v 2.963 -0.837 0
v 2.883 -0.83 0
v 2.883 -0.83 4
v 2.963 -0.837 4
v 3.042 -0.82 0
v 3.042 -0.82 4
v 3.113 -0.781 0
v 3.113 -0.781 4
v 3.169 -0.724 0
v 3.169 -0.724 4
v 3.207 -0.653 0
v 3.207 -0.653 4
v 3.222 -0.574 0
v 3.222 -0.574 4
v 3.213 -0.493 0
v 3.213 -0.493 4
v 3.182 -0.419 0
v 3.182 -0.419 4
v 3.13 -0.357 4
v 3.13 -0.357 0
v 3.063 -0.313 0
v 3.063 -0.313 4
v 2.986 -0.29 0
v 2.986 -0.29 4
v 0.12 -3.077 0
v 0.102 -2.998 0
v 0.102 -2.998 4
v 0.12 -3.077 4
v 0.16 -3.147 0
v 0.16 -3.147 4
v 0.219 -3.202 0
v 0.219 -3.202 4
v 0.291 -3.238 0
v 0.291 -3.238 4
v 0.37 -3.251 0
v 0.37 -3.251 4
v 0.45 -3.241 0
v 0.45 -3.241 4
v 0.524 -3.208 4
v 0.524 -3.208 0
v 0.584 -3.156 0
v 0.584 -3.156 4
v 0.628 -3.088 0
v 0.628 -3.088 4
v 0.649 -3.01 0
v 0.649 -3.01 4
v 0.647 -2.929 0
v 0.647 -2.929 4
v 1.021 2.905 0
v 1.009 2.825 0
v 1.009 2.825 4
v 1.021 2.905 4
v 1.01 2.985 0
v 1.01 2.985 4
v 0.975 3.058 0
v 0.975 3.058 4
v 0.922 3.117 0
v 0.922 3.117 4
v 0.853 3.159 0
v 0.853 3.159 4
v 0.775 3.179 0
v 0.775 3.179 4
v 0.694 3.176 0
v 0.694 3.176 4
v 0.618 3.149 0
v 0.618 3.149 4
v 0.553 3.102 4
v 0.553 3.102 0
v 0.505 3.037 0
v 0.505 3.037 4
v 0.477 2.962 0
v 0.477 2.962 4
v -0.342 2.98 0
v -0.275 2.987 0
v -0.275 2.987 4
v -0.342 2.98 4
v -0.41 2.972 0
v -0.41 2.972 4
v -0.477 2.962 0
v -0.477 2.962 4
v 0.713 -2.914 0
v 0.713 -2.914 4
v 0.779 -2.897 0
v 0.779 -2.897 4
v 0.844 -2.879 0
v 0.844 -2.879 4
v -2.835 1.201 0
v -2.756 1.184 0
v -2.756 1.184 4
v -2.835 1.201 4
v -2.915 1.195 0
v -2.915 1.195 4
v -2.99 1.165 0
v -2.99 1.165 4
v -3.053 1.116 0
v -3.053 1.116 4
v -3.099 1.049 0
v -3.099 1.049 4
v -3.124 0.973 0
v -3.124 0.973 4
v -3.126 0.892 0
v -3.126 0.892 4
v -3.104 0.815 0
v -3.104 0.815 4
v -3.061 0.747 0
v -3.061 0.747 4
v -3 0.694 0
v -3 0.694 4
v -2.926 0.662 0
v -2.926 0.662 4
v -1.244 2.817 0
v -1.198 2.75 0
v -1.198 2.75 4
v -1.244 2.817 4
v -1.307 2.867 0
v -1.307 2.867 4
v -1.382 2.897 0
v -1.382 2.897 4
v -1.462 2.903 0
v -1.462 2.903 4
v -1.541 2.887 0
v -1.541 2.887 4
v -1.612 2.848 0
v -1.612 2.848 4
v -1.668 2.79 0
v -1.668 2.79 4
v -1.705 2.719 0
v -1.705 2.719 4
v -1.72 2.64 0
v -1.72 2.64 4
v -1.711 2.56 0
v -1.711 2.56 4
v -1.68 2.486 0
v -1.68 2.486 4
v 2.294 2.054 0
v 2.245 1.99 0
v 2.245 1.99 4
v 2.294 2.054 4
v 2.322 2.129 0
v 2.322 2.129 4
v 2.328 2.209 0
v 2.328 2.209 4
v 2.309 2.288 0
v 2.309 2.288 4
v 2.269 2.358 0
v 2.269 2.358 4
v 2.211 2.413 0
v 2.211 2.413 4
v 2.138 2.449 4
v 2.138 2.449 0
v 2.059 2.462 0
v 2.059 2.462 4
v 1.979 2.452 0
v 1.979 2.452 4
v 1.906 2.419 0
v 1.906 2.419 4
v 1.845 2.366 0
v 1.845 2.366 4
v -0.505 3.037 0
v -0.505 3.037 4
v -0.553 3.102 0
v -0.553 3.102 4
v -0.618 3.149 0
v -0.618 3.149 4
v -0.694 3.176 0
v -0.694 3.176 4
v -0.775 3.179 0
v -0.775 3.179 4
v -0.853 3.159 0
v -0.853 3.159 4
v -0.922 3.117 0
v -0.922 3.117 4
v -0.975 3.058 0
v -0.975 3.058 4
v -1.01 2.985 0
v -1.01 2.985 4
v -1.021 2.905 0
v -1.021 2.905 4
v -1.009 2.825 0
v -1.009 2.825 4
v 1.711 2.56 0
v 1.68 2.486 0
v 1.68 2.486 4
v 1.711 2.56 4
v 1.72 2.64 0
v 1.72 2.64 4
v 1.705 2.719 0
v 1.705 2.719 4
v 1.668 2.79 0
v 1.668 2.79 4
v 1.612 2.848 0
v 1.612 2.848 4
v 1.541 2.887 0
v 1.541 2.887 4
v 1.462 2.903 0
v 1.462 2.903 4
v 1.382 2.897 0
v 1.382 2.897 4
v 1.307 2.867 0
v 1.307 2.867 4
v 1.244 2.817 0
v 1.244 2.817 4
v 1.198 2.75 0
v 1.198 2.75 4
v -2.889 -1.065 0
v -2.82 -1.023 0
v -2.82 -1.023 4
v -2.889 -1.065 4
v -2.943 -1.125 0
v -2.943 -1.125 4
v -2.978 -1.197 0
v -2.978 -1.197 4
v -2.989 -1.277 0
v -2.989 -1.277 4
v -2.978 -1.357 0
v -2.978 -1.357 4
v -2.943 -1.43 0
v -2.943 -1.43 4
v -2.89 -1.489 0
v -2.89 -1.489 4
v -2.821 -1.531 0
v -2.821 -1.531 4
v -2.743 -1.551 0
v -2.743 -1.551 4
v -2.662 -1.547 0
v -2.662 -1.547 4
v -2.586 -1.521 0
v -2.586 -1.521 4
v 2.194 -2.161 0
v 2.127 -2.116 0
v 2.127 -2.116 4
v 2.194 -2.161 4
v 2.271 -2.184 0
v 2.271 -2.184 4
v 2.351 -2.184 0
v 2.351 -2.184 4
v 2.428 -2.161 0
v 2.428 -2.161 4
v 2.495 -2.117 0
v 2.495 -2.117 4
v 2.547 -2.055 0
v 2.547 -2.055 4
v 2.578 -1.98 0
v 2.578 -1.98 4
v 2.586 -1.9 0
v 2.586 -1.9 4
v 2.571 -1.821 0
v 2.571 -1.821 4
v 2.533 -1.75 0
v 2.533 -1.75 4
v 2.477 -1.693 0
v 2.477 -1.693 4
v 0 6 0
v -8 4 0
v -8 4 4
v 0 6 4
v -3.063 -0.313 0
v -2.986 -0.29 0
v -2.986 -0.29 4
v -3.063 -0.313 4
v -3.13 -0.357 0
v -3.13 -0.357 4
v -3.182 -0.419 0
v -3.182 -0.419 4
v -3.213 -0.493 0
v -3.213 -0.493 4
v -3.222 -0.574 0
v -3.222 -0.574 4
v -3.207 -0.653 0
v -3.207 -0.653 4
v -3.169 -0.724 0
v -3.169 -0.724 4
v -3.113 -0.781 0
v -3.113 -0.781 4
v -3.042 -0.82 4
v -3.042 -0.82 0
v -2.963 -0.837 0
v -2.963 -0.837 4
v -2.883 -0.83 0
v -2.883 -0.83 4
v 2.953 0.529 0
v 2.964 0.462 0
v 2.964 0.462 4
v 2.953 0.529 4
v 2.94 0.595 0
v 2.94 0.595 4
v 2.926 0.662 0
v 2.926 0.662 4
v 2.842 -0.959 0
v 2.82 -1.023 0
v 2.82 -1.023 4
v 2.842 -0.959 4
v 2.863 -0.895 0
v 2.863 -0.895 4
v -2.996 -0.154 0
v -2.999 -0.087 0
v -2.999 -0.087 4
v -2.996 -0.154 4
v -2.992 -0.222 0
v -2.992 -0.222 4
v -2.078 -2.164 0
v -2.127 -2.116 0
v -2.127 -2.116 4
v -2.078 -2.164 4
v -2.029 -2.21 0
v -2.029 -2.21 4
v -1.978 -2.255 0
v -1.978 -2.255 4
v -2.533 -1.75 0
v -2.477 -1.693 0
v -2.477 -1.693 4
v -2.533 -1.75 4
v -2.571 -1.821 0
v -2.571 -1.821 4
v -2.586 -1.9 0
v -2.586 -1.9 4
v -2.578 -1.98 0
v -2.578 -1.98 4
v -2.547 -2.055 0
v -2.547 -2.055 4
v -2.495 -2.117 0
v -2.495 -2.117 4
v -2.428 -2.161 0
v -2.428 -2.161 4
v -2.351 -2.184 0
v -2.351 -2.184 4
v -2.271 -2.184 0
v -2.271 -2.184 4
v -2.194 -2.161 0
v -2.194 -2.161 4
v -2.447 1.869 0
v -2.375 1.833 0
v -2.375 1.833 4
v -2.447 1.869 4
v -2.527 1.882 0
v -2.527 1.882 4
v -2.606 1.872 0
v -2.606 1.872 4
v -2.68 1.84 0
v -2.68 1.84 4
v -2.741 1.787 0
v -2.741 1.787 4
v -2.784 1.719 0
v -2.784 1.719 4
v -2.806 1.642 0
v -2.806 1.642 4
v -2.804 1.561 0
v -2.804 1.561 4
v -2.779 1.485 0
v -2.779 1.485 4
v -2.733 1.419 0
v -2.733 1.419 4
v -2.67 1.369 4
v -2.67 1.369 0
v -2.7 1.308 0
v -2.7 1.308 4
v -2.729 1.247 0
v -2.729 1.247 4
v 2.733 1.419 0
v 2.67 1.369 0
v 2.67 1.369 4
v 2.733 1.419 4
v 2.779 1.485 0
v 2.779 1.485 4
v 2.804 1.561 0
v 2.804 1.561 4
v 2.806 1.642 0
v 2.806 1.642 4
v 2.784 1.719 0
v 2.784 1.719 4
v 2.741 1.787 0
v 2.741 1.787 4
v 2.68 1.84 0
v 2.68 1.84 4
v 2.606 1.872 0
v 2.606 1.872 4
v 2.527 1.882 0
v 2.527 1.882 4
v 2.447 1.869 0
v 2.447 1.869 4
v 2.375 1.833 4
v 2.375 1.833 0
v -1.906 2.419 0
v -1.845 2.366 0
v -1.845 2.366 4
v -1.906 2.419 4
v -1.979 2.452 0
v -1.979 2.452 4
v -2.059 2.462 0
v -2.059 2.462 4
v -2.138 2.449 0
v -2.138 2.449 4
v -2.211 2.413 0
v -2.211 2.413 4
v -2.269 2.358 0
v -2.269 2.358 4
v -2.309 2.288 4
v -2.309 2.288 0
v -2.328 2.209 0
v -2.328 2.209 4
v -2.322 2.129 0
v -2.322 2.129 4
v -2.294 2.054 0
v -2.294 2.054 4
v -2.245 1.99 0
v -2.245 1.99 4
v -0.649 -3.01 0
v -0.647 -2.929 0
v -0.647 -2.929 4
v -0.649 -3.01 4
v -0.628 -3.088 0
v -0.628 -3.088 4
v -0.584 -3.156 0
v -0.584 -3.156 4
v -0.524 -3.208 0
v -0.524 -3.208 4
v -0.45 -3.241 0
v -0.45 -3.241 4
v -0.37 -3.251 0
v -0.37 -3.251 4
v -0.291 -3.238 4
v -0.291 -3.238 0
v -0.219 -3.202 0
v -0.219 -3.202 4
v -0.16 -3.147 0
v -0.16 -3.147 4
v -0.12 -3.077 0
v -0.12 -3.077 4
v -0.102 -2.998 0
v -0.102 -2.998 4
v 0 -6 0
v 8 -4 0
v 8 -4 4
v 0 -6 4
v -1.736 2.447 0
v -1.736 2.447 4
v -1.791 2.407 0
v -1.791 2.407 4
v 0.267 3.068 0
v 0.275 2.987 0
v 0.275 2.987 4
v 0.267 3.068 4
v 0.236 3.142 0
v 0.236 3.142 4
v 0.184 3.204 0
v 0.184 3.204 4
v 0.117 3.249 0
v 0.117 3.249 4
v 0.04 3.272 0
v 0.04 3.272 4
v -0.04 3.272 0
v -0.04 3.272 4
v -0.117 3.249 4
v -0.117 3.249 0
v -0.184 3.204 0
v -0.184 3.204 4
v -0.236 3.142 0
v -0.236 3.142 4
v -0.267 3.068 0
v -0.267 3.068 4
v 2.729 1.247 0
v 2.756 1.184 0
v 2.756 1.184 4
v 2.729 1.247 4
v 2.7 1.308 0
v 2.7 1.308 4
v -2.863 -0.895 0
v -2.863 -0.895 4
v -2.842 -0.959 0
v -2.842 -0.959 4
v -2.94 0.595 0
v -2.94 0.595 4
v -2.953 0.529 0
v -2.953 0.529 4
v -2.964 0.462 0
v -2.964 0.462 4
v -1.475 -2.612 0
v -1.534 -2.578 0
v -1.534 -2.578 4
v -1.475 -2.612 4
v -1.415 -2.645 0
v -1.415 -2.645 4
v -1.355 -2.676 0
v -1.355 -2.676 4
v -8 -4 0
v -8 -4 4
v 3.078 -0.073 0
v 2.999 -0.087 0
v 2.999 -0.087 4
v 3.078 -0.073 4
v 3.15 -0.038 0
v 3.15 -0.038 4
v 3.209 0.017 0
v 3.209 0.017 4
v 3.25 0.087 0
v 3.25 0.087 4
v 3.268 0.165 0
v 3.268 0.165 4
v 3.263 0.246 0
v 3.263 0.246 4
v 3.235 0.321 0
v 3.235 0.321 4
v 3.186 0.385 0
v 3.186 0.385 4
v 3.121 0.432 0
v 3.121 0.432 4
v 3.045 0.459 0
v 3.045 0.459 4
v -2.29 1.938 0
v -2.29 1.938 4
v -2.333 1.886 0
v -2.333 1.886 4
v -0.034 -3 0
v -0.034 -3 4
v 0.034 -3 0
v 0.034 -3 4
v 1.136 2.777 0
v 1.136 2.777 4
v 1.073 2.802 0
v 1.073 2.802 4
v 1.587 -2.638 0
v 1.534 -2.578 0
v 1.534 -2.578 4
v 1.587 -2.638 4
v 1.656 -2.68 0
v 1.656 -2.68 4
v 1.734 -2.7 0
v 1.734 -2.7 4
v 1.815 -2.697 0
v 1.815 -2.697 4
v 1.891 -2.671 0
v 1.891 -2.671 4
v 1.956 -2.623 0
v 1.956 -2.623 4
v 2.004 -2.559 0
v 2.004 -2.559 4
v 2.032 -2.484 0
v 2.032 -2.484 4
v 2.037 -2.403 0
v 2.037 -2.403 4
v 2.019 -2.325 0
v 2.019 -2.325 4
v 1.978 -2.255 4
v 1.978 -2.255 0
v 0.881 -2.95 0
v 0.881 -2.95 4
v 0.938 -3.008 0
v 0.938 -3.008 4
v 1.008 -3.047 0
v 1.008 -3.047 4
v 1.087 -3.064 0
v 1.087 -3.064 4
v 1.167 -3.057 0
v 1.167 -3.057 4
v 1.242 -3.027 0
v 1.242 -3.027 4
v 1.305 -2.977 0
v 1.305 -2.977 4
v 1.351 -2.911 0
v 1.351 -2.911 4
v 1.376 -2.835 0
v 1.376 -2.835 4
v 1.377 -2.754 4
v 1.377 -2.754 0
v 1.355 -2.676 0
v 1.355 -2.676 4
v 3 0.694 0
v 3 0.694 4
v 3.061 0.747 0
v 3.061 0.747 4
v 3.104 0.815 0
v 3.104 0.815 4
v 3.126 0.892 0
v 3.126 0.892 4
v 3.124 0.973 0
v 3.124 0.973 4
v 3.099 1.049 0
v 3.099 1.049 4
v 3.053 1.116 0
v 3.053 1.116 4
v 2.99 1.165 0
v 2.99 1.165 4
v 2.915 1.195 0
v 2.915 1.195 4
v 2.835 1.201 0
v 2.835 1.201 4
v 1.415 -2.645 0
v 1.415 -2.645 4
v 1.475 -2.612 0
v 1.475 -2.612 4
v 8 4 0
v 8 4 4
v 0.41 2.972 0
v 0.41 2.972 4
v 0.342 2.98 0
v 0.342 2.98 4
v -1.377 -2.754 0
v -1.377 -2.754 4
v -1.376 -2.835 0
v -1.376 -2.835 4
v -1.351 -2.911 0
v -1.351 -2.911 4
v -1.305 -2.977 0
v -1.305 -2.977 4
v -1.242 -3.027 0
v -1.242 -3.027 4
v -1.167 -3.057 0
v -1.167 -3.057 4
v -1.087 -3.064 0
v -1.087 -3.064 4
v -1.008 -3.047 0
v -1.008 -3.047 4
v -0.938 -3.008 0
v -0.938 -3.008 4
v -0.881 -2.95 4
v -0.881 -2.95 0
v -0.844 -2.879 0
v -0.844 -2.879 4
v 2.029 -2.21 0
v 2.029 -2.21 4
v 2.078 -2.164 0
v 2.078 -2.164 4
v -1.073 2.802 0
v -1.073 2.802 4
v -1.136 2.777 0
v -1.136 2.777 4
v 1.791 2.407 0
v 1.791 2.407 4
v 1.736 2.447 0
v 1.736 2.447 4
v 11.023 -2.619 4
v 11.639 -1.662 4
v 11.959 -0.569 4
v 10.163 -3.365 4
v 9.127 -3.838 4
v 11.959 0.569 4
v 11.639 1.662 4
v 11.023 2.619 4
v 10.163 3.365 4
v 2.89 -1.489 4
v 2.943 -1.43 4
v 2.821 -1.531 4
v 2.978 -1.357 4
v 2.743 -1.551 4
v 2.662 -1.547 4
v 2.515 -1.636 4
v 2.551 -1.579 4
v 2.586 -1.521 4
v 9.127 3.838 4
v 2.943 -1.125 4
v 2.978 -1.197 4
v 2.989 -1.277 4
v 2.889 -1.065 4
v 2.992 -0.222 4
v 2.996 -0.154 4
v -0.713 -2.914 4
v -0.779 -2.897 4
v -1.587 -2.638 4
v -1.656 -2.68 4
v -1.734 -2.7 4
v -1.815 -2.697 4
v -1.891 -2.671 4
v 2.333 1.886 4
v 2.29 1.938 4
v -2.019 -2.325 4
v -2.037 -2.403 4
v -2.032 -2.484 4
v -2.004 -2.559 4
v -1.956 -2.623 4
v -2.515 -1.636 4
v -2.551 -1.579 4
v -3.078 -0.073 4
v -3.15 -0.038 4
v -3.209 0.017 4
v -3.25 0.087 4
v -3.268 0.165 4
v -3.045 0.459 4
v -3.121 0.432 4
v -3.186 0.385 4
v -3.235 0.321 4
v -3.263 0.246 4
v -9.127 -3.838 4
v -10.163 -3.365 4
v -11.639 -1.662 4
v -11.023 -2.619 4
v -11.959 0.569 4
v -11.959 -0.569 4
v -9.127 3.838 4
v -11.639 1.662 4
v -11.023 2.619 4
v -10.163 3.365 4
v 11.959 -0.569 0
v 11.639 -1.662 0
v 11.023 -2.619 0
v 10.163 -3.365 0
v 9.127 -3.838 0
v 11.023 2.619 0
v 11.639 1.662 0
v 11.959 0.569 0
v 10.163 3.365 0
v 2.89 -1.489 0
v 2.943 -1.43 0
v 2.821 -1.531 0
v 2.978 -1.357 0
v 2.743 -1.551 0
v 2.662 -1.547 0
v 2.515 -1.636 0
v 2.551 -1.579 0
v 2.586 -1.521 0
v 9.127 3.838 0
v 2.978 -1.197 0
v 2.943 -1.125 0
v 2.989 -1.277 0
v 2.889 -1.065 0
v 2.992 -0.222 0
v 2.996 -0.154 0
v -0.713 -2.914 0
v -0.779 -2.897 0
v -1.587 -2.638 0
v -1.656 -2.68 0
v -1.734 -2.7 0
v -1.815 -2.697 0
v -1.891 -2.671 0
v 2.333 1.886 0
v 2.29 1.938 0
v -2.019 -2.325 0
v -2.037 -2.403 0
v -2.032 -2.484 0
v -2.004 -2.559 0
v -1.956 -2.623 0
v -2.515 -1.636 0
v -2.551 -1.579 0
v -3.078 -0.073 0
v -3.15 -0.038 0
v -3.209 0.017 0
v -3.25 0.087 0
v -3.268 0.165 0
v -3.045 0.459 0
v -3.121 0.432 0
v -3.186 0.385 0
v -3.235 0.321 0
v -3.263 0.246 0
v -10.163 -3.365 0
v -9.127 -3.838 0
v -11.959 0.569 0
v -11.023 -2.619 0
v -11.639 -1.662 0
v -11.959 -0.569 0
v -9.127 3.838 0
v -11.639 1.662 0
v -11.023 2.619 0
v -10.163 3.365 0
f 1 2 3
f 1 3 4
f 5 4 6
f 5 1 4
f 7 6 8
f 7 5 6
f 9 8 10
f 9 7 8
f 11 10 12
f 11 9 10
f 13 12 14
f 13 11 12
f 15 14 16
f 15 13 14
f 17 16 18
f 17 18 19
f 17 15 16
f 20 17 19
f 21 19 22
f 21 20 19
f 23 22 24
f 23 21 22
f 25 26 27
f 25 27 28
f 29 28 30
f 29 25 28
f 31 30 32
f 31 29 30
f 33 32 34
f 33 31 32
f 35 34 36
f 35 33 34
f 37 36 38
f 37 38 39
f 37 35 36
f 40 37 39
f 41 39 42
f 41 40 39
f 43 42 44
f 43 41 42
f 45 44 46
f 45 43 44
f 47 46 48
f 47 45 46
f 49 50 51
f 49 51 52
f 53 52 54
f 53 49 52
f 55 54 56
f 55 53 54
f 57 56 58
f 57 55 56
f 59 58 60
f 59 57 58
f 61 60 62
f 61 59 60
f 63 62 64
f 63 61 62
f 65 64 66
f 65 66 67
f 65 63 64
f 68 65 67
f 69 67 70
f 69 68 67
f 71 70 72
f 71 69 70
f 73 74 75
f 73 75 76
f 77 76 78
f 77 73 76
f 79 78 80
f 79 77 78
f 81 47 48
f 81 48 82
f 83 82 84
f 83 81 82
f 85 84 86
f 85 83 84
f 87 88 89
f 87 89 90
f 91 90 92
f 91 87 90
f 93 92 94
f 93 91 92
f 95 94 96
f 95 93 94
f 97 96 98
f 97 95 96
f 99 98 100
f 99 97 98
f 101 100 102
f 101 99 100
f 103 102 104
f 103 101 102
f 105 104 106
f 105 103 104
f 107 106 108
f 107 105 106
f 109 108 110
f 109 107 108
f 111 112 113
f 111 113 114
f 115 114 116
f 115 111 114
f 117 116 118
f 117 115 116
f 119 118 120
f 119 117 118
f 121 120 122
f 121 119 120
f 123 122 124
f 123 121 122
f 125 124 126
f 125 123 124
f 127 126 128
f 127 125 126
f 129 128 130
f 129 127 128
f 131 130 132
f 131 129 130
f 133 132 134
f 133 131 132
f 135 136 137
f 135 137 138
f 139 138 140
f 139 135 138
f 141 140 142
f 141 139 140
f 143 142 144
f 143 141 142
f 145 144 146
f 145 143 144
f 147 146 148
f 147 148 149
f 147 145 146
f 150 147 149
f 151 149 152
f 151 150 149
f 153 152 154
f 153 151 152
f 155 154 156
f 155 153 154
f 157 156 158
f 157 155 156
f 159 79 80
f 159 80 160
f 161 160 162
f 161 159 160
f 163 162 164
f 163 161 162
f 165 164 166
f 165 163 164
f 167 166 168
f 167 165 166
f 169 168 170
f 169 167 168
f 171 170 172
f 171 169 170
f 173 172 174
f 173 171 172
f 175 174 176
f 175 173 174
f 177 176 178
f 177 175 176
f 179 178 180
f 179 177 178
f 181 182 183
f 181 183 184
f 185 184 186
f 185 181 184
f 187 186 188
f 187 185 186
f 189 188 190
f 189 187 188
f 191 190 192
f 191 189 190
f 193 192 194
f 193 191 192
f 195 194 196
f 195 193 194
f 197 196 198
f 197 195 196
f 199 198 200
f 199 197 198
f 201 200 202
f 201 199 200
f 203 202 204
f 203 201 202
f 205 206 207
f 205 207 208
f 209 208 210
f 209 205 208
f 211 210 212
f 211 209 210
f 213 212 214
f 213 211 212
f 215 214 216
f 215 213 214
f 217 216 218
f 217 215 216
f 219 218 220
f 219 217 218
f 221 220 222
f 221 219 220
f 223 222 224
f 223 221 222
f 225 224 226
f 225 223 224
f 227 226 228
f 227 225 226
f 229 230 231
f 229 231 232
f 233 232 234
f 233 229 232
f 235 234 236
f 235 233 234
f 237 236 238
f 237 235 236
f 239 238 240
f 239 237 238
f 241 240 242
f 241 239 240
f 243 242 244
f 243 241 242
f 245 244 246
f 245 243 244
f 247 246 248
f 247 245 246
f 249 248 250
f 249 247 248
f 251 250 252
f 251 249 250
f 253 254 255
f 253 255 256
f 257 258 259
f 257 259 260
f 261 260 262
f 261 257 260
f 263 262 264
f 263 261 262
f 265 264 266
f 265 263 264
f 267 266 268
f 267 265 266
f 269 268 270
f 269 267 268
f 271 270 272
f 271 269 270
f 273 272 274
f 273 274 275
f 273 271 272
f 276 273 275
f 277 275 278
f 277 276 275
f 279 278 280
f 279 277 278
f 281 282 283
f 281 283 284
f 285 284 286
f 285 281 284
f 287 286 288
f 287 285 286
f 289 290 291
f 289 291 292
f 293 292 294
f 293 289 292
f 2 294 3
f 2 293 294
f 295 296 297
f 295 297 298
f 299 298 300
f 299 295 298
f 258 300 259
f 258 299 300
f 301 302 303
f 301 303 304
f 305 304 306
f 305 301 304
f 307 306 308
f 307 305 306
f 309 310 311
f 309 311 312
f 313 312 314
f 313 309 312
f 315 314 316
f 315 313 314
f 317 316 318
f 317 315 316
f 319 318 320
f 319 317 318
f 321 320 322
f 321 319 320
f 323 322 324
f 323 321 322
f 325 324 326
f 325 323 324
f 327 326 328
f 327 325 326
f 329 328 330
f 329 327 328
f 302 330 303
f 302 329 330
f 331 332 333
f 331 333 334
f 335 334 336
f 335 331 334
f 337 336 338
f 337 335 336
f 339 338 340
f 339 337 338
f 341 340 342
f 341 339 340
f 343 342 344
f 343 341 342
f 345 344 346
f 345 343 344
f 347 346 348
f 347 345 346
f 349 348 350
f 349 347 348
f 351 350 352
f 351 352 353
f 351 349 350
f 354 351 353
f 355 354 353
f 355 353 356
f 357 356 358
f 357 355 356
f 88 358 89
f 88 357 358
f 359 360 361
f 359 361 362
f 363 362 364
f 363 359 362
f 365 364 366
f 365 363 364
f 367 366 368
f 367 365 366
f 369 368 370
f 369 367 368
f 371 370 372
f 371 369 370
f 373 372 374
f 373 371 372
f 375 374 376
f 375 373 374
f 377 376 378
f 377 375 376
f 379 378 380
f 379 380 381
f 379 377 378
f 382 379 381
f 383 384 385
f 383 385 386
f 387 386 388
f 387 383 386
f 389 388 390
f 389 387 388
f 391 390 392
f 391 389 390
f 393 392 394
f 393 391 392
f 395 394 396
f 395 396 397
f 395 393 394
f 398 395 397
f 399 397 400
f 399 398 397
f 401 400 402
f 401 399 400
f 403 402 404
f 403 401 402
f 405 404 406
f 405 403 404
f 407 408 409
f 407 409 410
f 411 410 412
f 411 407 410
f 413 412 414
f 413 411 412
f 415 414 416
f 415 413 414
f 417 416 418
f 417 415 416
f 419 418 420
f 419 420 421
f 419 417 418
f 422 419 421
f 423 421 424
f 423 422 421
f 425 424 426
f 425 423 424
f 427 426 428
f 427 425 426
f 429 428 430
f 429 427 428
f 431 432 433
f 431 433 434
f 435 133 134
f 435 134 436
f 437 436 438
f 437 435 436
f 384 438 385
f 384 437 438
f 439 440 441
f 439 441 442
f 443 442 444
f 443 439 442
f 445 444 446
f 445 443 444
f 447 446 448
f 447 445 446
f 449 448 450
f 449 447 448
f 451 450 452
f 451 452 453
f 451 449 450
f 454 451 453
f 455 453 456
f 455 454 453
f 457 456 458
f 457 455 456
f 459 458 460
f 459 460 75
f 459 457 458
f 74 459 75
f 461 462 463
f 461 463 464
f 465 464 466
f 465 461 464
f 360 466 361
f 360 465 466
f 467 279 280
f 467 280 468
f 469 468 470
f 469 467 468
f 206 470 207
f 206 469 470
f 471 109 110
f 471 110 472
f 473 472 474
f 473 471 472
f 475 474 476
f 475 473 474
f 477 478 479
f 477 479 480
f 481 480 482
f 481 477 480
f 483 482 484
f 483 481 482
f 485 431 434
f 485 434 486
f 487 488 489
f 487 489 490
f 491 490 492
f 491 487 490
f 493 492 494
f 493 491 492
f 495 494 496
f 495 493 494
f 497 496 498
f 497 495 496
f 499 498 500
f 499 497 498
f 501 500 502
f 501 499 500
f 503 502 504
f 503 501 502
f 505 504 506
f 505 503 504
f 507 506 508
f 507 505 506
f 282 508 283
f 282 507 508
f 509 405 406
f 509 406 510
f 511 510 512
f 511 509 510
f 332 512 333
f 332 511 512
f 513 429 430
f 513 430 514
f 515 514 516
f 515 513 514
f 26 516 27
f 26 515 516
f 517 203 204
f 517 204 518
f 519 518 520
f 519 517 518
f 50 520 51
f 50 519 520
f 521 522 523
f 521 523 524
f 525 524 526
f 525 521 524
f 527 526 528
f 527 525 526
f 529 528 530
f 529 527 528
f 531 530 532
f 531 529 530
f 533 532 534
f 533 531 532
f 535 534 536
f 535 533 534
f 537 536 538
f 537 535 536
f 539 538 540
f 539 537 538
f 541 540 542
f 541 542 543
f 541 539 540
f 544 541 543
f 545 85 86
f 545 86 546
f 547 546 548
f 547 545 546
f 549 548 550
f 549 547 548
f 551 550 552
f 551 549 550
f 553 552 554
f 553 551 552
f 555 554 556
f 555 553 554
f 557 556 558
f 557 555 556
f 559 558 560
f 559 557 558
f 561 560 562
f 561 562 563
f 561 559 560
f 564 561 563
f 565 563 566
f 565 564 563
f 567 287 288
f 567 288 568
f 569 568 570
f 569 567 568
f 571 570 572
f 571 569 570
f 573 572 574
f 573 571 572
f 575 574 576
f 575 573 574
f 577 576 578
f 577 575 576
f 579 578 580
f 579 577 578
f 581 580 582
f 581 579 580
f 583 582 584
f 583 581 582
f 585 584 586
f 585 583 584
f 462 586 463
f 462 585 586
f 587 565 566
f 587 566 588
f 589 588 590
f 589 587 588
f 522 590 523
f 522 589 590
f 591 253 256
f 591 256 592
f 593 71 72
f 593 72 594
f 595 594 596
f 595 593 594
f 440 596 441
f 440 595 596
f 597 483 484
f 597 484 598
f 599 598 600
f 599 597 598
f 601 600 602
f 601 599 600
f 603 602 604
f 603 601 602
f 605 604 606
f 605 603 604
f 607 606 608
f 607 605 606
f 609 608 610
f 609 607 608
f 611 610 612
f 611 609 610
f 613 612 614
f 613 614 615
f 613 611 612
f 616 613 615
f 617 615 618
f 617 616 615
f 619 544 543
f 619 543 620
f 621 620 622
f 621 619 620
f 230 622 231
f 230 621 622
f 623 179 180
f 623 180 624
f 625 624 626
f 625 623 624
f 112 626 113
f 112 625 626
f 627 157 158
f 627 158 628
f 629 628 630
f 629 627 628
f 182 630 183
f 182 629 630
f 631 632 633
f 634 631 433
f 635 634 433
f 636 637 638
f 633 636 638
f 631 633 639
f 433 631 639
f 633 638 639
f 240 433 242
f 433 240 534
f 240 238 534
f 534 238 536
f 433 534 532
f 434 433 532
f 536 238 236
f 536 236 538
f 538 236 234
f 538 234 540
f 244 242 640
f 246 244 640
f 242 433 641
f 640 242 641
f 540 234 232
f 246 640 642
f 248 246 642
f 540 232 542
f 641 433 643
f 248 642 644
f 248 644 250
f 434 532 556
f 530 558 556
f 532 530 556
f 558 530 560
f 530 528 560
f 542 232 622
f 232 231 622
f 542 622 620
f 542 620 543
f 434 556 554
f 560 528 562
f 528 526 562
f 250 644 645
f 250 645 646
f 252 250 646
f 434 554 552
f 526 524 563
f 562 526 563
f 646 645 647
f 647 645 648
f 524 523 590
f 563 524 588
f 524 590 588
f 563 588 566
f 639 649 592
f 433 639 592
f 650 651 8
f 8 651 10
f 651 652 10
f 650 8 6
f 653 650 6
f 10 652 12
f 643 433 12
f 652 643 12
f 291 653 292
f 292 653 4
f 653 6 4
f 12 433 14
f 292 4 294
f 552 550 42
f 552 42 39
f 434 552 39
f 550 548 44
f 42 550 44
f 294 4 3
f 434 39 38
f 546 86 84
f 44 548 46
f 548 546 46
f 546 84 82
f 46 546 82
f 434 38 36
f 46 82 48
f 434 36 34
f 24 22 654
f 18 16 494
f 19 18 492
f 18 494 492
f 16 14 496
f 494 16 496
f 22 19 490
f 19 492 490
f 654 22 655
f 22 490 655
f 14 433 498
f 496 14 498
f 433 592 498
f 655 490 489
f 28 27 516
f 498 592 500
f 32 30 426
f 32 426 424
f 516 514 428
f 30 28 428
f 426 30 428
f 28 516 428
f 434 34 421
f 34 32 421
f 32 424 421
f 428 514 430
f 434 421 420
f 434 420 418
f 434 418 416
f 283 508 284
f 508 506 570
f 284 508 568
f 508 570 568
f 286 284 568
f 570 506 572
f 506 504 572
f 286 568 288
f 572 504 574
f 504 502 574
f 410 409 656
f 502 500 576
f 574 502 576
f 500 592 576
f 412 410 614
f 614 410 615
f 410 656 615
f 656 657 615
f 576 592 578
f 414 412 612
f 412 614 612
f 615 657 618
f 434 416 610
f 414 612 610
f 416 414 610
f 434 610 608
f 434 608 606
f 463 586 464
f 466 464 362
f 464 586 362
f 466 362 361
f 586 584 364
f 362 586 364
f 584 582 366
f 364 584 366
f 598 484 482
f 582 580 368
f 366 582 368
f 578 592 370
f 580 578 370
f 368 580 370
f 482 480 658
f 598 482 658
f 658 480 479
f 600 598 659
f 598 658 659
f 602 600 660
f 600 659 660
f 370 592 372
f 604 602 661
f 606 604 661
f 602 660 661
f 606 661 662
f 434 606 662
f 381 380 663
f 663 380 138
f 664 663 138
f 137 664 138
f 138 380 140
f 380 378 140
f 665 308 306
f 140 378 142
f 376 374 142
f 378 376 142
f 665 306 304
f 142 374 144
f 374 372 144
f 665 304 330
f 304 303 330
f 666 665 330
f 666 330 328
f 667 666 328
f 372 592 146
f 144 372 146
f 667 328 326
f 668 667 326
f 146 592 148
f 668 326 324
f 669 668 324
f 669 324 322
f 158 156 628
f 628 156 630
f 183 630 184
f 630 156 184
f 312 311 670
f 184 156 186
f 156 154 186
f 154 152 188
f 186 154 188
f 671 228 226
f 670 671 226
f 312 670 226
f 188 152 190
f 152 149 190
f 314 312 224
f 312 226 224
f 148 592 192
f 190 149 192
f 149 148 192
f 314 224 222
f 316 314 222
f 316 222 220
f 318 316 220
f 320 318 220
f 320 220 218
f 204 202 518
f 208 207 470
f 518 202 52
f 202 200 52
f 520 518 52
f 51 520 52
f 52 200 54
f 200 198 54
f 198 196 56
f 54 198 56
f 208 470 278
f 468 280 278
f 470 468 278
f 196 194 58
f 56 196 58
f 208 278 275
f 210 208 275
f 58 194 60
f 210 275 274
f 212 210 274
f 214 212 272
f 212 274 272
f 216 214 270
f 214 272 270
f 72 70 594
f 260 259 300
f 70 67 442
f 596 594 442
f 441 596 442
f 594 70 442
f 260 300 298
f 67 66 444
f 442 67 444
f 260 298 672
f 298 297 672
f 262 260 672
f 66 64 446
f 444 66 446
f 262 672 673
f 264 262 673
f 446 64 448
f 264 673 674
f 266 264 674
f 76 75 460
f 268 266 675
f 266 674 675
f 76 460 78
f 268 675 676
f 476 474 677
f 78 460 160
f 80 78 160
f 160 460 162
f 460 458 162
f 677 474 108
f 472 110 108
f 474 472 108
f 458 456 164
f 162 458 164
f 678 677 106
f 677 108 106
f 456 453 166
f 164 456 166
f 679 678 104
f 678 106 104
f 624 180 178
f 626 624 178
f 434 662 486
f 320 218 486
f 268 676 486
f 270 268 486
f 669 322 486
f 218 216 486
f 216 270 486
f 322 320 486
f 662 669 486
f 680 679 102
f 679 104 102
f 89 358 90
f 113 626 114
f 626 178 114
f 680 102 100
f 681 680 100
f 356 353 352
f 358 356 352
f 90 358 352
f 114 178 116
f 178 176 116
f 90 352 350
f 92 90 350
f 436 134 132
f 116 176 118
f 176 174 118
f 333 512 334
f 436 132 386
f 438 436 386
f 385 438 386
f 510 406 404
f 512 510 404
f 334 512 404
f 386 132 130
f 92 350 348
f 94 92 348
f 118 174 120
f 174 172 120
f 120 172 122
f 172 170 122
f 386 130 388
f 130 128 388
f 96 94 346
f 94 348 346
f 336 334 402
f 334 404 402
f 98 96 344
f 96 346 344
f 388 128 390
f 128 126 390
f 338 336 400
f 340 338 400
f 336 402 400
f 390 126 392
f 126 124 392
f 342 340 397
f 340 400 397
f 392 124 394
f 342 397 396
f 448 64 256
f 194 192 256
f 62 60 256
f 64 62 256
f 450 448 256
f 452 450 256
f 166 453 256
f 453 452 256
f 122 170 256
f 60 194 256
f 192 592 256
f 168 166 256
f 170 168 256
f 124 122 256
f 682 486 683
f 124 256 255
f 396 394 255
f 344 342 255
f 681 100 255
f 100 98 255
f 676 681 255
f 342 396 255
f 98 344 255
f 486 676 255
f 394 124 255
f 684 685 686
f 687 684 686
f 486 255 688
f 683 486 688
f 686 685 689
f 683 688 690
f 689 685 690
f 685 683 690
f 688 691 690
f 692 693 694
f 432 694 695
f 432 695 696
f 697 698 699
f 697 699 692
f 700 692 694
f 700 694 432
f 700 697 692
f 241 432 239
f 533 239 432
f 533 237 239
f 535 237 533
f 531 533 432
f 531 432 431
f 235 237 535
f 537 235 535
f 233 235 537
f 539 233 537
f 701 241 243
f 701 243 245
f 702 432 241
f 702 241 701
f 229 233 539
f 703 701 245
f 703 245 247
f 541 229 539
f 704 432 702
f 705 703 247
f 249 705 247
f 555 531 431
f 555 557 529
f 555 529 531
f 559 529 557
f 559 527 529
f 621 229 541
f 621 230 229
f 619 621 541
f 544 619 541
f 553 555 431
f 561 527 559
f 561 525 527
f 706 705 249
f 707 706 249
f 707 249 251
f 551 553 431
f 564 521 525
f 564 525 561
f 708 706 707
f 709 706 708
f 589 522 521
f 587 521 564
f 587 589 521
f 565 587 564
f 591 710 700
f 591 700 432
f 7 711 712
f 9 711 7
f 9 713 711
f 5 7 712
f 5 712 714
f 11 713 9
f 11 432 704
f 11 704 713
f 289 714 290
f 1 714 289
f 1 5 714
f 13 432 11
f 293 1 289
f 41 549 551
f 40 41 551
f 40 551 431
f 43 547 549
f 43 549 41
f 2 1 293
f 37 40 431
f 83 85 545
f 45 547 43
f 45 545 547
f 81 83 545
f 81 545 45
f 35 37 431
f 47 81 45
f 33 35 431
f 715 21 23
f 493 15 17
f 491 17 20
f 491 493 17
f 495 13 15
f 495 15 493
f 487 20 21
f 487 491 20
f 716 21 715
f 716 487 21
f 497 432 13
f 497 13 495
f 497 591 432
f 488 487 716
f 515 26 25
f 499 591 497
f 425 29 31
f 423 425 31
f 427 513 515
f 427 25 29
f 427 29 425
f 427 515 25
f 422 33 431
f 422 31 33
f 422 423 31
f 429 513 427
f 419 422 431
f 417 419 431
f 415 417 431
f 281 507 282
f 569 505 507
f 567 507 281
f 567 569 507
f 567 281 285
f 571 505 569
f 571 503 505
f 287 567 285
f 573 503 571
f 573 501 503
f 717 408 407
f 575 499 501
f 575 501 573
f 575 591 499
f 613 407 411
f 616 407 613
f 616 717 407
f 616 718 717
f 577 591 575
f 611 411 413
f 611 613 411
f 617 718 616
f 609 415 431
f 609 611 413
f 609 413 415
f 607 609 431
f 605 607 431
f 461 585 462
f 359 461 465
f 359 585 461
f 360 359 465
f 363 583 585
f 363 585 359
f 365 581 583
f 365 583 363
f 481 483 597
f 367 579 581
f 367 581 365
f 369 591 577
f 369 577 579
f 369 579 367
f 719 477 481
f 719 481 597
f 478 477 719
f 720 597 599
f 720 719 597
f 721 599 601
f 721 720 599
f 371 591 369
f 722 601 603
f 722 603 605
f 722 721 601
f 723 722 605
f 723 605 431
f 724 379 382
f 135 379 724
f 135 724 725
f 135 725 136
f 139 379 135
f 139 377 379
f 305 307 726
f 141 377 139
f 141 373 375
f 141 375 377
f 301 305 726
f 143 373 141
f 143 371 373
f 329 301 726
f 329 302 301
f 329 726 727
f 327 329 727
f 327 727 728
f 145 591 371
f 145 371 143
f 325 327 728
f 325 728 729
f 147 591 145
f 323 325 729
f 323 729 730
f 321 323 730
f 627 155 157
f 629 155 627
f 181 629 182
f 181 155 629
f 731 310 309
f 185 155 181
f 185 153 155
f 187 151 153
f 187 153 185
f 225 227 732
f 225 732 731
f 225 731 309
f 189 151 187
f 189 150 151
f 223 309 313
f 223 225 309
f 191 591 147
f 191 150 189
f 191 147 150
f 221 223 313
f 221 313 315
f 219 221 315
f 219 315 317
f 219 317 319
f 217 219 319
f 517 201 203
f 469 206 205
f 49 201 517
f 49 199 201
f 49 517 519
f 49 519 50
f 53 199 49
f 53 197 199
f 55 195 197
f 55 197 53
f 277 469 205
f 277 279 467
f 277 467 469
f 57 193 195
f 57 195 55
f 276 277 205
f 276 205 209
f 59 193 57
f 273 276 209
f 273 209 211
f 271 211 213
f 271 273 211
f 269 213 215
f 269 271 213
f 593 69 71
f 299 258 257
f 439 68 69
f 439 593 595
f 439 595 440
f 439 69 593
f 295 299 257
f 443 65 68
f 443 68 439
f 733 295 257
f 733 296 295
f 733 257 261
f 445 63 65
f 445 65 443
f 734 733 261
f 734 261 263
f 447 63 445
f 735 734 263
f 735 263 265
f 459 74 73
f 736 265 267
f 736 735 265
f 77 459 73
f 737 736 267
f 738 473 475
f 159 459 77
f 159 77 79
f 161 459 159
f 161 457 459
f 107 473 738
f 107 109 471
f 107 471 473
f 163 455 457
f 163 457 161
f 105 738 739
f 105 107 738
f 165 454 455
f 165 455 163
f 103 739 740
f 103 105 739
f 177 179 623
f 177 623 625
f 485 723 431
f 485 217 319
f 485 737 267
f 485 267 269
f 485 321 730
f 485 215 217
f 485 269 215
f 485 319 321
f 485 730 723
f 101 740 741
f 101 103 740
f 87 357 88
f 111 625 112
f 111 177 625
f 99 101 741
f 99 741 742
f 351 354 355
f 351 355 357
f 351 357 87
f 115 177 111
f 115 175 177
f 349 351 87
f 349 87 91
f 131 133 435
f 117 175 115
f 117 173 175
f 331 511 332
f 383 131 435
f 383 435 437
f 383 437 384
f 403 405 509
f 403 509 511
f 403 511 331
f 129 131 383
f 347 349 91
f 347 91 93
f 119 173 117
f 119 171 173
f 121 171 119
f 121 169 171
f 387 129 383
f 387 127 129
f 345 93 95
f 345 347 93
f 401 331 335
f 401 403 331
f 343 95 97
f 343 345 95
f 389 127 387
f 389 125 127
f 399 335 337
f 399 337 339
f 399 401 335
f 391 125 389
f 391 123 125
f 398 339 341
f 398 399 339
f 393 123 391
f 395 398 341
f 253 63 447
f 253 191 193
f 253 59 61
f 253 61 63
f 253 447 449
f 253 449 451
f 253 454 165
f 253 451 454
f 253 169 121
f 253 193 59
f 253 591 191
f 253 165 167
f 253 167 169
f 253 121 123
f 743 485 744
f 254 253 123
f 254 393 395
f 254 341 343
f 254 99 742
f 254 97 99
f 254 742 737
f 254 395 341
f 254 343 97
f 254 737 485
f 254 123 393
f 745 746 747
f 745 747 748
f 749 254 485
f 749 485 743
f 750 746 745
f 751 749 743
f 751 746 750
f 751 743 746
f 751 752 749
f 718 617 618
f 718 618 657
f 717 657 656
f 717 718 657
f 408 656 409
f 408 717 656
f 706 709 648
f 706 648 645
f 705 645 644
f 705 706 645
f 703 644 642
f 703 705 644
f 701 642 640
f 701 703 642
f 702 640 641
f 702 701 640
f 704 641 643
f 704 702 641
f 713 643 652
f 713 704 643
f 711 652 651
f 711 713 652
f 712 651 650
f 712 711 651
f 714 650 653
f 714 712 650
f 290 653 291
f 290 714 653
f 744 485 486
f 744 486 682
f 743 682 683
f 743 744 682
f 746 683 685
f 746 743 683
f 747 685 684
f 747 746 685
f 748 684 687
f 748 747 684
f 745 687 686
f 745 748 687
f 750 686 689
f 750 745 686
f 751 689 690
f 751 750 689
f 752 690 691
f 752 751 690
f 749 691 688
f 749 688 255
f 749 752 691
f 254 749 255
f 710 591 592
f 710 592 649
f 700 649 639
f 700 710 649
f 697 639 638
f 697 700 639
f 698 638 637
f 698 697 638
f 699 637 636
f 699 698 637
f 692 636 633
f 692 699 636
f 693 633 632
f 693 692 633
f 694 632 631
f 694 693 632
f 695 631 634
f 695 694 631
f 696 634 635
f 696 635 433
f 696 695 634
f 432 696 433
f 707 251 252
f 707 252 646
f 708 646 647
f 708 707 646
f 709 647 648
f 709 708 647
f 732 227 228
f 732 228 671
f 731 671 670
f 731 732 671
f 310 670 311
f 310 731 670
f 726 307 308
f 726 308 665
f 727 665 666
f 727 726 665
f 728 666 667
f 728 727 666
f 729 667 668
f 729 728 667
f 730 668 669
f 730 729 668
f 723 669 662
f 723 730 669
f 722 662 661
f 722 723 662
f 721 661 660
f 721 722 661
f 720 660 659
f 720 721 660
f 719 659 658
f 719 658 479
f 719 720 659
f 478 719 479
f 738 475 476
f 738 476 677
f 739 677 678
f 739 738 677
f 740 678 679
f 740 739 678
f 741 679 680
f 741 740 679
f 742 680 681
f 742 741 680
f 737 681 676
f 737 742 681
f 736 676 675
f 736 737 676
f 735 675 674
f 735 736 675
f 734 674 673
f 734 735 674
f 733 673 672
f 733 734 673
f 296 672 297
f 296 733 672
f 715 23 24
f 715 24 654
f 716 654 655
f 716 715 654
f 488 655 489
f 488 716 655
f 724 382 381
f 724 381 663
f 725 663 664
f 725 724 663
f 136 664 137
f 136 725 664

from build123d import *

# Parameters (mm, degrees)
GRUNDK_RPER_DEPTH = 4


with BuildPart() as part:
    # Skizze1 → Grundkörper (new body)
    with BuildSketch(Plane.XY):
        with BuildLine():
            Line((-8, 4), (0, 6))
            Line((0, 6), (8, 4))
            ThreePointArc((8, 4), (12, 0), (8, -4))
            Line((8, -4), (0, -6))
            Line((0, -6), (-8, -4))
            ThreePointArc((-8, -4), (-12, 0), (-8, 4))
        make_face()
        with BuildLine():
            ThreePointArc((1.198457832, 2.75021796), (1.104373658, 2.789329458), (1.009015584, 2.825223452))
            ThreePointArc((1.009015584, 2.825223452), (0.81445938, 3.172109853), (0.476854681, 2.961859148))
            ThreePointArc((0.476854681, 2.961859148), (0.375999701, 2.976344104), (0.274711003, 2.987395833))
            ThreePointArc((0.274711003, 2.987395833), (0, 3.275), (-0.274711003, 2.987395833))
            ThreePointArc((-0.274711003, 2.987395833), (-0.375999701, 2.976344104), (-0.476854681, 2.961859148))
            ThreePointArc((-0.476854681, 2.961859148), (-0.81445938, 3.172109853), (-1.009015584, 2.825223452))
            ThreePointArc((-1.009015584, 2.825223452), (-1.104373658, 2.789329458), (-1.198457832, 2.75021796))
            ThreePointArc((-1.198457832, 2.75021796), (-1.577743283, 2.869904377), (-1.679920005, 2.48553189))
            ThreePointArc((-1.679920005, 2.48553189), (-1.763355757, 2.427050983), (-1.844757469, 2.365770462))
            ThreePointArc((-1.844757469, 2.365770462), (-2.241891772, 2.387372255), (-2.245268875, 1.989665218))
            ThreePointArc((-2.245268875, 1.989665218), (-2.311539728, 1.912271969), (-2.375144211, 1.832672906))
            ThreePointArc((-2.375144211, 1.832672906), (-2.765173956, 1.754832754), (-2.669539243, 1.368780564))
            ThreePointArc((-2.669539243, 1.368780564), (-2.714481157, 1.277337875), (-2.756291906, 1.184421771))
            ThreePointArc((-2.756291906, 1.184421771), (-3.114710091, 1.012030657), (-2.926072642, 0.661890392))
            ThreePointArc((-2.926072642, 0.661890392), (-2.946861752, 0.562143944), (-2.964251643, 0.46174906))
            ThreePointArc((-2.964251643, 0.46174906), (-3.268537536, 0.205638951), (-2.998750137, -0.086588787))
            ThreePointArc((-2.998750137, -0.086588787), (-2.994080185, -0.188371559), (-2.985956549, -0.289937043))
            ThreePointArc((-2.985956549, -0.289937043), (-3.216990746, -0.613673805), (-2.883005131, -0.829627274))
            ThreePointArc((-2.883005131, -0.829627274), (-2.853169549, -0.927050983), (-2.820042823, -1.023405335))
            ThreePointArc((-2.820042823, -1.023405335), (-2.963308597, -1.39442718), (-2.58611031, -1.520537228))
            ThreePointArc((-2.58611031, -1.520537228), (-2.532983777, -1.607480385), (-2.476935434, -1.692569306))
            ThreePointArc((-2.476935434, -1.692569306), (-2.52343087, -2.087563566), (-2.126720668, -2.115906237))
            ThreePointArc((-2.126720668, -2.115906237), (-2.053641318, -2.186905882), (-1.978193083, -2.255382922))
            ThreePointArc((-1.978193083, -2.255382922), (-1.924996701, -2.649530657), (-1.533701344, -2.578325074))
            ThreePointArc((-1.533701344, -2.578325074), (-1.445261022, -2.62892004), (-1.355153586, -2.676482535))
            ThreePointArc((-1.355153586, -2.676482535), (-1.20560791, -3.045017991), (-0.844313924, -2.878738265))
            ThreePointArc((-0.844313924, -2.878738265), (-0.746069661, -2.905749483), (-0.646964804, -2.929408907))
            ThreePointArc((-0.646964804, -2.929408907), (-0.41046634, -3.249175647), (-0.101875155, -2.998269743))
            ThreePointArc((-0.101875155, -2.998269743), (0, -3), (0.101875155, -2.998269743))
            ThreePointArc((0.101875155, -2.998269743), (0.41046634, -3.249175647), (0.646964804, -2.929408907))
            ThreePointArc((0.646964804, -2.929408907), (0.746069661, -2.905749483), (0.844313924, -2.878738265))
            ThreePointArc((0.844313924, -2.878738265), (1.20560791, -3.045017991), (1.355153586, -2.676482535))
            ThreePointArc((1.355153586, -2.676482535), (1.445261022, -2.62892004), (1.533701344, -2.578325074))
            ThreePointArc((1.533701344, -2.578325074), (1.924996701, -2.649530657), (1.978193083, -2.255382922))
            ThreePointArc((1.978193083, -2.255382922), (2.053641318, -2.186905882), (2.126720668, -2.115906237))
            ThreePointArc((2.126720668, -2.115906237), (2.52343087, -2.087563566), (2.476935434, -1.692569306))
            ThreePointArc((2.476935434, -1.692569306), (2.532983777, -1.607480385), (2.58611031, -1.520537228))
            ThreePointArc((2.58611031, -1.520537228), (2.963308597, -1.39442718), (2.820042823, -1.023405335))
            ThreePointArc((2.820042823, -1.023405335), (2.853169549, -0.927050983), (2.883005131, -0.829627274))
            ThreePointArc((2.883005131, -0.829627274), (3.216990746, -0.613673805), (2.985956549, -0.289937043))
            ThreePointArc((2.985956549, -0.289937043), (2.994080185, -0.188371559), (2.998750137, -0.086588787))
            ThreePointArc((2.998750137, -0.086588787), (3.268537536, 0.205638951), (2.964251643, 0.46174906))
            ThreePointArc((2.964251643, 0.46174906), (2.946861752, 0.562143944), (2.926072642, 0.661890392))
            ThreePointArc((2.926072642, 0.661890392), (3.114710091, 1.012030657), (2.756291906, 1.184421771))
            ThreePointArc((2.756291906, 1.184421771), (2.714481157, 1.277337875), (2.669539243, 1.368780564))
            ThreePointArc((2.669539243, 1.368780564), (2.765173956, 1.754832754), (2.375144211, 1.832672906))
            ThreePointArc((2.375144211, 1.832672906), (2.311539728, 1.912271969), (2.245268875, 1.989665218))
            ThreePointArc((2.245268875, 1.989665218), (2.241891772, 2.387372255), (1.844757469, 2.365770462))
            ThreePointArc((1.844757469, 2.365770462), (1.763355757, 2.427050983), (1.679920005, 2.48553189))
            ThreePointArc((1.679920005, 2.48553189), (1.577743283, 2.869904377), (1.198457832, 2.75021796))
        make_face(mode=Mode.SUBTRACT)
    extrude(amount=GRUNDK_RPER_DEPTH)


solid = part.part
